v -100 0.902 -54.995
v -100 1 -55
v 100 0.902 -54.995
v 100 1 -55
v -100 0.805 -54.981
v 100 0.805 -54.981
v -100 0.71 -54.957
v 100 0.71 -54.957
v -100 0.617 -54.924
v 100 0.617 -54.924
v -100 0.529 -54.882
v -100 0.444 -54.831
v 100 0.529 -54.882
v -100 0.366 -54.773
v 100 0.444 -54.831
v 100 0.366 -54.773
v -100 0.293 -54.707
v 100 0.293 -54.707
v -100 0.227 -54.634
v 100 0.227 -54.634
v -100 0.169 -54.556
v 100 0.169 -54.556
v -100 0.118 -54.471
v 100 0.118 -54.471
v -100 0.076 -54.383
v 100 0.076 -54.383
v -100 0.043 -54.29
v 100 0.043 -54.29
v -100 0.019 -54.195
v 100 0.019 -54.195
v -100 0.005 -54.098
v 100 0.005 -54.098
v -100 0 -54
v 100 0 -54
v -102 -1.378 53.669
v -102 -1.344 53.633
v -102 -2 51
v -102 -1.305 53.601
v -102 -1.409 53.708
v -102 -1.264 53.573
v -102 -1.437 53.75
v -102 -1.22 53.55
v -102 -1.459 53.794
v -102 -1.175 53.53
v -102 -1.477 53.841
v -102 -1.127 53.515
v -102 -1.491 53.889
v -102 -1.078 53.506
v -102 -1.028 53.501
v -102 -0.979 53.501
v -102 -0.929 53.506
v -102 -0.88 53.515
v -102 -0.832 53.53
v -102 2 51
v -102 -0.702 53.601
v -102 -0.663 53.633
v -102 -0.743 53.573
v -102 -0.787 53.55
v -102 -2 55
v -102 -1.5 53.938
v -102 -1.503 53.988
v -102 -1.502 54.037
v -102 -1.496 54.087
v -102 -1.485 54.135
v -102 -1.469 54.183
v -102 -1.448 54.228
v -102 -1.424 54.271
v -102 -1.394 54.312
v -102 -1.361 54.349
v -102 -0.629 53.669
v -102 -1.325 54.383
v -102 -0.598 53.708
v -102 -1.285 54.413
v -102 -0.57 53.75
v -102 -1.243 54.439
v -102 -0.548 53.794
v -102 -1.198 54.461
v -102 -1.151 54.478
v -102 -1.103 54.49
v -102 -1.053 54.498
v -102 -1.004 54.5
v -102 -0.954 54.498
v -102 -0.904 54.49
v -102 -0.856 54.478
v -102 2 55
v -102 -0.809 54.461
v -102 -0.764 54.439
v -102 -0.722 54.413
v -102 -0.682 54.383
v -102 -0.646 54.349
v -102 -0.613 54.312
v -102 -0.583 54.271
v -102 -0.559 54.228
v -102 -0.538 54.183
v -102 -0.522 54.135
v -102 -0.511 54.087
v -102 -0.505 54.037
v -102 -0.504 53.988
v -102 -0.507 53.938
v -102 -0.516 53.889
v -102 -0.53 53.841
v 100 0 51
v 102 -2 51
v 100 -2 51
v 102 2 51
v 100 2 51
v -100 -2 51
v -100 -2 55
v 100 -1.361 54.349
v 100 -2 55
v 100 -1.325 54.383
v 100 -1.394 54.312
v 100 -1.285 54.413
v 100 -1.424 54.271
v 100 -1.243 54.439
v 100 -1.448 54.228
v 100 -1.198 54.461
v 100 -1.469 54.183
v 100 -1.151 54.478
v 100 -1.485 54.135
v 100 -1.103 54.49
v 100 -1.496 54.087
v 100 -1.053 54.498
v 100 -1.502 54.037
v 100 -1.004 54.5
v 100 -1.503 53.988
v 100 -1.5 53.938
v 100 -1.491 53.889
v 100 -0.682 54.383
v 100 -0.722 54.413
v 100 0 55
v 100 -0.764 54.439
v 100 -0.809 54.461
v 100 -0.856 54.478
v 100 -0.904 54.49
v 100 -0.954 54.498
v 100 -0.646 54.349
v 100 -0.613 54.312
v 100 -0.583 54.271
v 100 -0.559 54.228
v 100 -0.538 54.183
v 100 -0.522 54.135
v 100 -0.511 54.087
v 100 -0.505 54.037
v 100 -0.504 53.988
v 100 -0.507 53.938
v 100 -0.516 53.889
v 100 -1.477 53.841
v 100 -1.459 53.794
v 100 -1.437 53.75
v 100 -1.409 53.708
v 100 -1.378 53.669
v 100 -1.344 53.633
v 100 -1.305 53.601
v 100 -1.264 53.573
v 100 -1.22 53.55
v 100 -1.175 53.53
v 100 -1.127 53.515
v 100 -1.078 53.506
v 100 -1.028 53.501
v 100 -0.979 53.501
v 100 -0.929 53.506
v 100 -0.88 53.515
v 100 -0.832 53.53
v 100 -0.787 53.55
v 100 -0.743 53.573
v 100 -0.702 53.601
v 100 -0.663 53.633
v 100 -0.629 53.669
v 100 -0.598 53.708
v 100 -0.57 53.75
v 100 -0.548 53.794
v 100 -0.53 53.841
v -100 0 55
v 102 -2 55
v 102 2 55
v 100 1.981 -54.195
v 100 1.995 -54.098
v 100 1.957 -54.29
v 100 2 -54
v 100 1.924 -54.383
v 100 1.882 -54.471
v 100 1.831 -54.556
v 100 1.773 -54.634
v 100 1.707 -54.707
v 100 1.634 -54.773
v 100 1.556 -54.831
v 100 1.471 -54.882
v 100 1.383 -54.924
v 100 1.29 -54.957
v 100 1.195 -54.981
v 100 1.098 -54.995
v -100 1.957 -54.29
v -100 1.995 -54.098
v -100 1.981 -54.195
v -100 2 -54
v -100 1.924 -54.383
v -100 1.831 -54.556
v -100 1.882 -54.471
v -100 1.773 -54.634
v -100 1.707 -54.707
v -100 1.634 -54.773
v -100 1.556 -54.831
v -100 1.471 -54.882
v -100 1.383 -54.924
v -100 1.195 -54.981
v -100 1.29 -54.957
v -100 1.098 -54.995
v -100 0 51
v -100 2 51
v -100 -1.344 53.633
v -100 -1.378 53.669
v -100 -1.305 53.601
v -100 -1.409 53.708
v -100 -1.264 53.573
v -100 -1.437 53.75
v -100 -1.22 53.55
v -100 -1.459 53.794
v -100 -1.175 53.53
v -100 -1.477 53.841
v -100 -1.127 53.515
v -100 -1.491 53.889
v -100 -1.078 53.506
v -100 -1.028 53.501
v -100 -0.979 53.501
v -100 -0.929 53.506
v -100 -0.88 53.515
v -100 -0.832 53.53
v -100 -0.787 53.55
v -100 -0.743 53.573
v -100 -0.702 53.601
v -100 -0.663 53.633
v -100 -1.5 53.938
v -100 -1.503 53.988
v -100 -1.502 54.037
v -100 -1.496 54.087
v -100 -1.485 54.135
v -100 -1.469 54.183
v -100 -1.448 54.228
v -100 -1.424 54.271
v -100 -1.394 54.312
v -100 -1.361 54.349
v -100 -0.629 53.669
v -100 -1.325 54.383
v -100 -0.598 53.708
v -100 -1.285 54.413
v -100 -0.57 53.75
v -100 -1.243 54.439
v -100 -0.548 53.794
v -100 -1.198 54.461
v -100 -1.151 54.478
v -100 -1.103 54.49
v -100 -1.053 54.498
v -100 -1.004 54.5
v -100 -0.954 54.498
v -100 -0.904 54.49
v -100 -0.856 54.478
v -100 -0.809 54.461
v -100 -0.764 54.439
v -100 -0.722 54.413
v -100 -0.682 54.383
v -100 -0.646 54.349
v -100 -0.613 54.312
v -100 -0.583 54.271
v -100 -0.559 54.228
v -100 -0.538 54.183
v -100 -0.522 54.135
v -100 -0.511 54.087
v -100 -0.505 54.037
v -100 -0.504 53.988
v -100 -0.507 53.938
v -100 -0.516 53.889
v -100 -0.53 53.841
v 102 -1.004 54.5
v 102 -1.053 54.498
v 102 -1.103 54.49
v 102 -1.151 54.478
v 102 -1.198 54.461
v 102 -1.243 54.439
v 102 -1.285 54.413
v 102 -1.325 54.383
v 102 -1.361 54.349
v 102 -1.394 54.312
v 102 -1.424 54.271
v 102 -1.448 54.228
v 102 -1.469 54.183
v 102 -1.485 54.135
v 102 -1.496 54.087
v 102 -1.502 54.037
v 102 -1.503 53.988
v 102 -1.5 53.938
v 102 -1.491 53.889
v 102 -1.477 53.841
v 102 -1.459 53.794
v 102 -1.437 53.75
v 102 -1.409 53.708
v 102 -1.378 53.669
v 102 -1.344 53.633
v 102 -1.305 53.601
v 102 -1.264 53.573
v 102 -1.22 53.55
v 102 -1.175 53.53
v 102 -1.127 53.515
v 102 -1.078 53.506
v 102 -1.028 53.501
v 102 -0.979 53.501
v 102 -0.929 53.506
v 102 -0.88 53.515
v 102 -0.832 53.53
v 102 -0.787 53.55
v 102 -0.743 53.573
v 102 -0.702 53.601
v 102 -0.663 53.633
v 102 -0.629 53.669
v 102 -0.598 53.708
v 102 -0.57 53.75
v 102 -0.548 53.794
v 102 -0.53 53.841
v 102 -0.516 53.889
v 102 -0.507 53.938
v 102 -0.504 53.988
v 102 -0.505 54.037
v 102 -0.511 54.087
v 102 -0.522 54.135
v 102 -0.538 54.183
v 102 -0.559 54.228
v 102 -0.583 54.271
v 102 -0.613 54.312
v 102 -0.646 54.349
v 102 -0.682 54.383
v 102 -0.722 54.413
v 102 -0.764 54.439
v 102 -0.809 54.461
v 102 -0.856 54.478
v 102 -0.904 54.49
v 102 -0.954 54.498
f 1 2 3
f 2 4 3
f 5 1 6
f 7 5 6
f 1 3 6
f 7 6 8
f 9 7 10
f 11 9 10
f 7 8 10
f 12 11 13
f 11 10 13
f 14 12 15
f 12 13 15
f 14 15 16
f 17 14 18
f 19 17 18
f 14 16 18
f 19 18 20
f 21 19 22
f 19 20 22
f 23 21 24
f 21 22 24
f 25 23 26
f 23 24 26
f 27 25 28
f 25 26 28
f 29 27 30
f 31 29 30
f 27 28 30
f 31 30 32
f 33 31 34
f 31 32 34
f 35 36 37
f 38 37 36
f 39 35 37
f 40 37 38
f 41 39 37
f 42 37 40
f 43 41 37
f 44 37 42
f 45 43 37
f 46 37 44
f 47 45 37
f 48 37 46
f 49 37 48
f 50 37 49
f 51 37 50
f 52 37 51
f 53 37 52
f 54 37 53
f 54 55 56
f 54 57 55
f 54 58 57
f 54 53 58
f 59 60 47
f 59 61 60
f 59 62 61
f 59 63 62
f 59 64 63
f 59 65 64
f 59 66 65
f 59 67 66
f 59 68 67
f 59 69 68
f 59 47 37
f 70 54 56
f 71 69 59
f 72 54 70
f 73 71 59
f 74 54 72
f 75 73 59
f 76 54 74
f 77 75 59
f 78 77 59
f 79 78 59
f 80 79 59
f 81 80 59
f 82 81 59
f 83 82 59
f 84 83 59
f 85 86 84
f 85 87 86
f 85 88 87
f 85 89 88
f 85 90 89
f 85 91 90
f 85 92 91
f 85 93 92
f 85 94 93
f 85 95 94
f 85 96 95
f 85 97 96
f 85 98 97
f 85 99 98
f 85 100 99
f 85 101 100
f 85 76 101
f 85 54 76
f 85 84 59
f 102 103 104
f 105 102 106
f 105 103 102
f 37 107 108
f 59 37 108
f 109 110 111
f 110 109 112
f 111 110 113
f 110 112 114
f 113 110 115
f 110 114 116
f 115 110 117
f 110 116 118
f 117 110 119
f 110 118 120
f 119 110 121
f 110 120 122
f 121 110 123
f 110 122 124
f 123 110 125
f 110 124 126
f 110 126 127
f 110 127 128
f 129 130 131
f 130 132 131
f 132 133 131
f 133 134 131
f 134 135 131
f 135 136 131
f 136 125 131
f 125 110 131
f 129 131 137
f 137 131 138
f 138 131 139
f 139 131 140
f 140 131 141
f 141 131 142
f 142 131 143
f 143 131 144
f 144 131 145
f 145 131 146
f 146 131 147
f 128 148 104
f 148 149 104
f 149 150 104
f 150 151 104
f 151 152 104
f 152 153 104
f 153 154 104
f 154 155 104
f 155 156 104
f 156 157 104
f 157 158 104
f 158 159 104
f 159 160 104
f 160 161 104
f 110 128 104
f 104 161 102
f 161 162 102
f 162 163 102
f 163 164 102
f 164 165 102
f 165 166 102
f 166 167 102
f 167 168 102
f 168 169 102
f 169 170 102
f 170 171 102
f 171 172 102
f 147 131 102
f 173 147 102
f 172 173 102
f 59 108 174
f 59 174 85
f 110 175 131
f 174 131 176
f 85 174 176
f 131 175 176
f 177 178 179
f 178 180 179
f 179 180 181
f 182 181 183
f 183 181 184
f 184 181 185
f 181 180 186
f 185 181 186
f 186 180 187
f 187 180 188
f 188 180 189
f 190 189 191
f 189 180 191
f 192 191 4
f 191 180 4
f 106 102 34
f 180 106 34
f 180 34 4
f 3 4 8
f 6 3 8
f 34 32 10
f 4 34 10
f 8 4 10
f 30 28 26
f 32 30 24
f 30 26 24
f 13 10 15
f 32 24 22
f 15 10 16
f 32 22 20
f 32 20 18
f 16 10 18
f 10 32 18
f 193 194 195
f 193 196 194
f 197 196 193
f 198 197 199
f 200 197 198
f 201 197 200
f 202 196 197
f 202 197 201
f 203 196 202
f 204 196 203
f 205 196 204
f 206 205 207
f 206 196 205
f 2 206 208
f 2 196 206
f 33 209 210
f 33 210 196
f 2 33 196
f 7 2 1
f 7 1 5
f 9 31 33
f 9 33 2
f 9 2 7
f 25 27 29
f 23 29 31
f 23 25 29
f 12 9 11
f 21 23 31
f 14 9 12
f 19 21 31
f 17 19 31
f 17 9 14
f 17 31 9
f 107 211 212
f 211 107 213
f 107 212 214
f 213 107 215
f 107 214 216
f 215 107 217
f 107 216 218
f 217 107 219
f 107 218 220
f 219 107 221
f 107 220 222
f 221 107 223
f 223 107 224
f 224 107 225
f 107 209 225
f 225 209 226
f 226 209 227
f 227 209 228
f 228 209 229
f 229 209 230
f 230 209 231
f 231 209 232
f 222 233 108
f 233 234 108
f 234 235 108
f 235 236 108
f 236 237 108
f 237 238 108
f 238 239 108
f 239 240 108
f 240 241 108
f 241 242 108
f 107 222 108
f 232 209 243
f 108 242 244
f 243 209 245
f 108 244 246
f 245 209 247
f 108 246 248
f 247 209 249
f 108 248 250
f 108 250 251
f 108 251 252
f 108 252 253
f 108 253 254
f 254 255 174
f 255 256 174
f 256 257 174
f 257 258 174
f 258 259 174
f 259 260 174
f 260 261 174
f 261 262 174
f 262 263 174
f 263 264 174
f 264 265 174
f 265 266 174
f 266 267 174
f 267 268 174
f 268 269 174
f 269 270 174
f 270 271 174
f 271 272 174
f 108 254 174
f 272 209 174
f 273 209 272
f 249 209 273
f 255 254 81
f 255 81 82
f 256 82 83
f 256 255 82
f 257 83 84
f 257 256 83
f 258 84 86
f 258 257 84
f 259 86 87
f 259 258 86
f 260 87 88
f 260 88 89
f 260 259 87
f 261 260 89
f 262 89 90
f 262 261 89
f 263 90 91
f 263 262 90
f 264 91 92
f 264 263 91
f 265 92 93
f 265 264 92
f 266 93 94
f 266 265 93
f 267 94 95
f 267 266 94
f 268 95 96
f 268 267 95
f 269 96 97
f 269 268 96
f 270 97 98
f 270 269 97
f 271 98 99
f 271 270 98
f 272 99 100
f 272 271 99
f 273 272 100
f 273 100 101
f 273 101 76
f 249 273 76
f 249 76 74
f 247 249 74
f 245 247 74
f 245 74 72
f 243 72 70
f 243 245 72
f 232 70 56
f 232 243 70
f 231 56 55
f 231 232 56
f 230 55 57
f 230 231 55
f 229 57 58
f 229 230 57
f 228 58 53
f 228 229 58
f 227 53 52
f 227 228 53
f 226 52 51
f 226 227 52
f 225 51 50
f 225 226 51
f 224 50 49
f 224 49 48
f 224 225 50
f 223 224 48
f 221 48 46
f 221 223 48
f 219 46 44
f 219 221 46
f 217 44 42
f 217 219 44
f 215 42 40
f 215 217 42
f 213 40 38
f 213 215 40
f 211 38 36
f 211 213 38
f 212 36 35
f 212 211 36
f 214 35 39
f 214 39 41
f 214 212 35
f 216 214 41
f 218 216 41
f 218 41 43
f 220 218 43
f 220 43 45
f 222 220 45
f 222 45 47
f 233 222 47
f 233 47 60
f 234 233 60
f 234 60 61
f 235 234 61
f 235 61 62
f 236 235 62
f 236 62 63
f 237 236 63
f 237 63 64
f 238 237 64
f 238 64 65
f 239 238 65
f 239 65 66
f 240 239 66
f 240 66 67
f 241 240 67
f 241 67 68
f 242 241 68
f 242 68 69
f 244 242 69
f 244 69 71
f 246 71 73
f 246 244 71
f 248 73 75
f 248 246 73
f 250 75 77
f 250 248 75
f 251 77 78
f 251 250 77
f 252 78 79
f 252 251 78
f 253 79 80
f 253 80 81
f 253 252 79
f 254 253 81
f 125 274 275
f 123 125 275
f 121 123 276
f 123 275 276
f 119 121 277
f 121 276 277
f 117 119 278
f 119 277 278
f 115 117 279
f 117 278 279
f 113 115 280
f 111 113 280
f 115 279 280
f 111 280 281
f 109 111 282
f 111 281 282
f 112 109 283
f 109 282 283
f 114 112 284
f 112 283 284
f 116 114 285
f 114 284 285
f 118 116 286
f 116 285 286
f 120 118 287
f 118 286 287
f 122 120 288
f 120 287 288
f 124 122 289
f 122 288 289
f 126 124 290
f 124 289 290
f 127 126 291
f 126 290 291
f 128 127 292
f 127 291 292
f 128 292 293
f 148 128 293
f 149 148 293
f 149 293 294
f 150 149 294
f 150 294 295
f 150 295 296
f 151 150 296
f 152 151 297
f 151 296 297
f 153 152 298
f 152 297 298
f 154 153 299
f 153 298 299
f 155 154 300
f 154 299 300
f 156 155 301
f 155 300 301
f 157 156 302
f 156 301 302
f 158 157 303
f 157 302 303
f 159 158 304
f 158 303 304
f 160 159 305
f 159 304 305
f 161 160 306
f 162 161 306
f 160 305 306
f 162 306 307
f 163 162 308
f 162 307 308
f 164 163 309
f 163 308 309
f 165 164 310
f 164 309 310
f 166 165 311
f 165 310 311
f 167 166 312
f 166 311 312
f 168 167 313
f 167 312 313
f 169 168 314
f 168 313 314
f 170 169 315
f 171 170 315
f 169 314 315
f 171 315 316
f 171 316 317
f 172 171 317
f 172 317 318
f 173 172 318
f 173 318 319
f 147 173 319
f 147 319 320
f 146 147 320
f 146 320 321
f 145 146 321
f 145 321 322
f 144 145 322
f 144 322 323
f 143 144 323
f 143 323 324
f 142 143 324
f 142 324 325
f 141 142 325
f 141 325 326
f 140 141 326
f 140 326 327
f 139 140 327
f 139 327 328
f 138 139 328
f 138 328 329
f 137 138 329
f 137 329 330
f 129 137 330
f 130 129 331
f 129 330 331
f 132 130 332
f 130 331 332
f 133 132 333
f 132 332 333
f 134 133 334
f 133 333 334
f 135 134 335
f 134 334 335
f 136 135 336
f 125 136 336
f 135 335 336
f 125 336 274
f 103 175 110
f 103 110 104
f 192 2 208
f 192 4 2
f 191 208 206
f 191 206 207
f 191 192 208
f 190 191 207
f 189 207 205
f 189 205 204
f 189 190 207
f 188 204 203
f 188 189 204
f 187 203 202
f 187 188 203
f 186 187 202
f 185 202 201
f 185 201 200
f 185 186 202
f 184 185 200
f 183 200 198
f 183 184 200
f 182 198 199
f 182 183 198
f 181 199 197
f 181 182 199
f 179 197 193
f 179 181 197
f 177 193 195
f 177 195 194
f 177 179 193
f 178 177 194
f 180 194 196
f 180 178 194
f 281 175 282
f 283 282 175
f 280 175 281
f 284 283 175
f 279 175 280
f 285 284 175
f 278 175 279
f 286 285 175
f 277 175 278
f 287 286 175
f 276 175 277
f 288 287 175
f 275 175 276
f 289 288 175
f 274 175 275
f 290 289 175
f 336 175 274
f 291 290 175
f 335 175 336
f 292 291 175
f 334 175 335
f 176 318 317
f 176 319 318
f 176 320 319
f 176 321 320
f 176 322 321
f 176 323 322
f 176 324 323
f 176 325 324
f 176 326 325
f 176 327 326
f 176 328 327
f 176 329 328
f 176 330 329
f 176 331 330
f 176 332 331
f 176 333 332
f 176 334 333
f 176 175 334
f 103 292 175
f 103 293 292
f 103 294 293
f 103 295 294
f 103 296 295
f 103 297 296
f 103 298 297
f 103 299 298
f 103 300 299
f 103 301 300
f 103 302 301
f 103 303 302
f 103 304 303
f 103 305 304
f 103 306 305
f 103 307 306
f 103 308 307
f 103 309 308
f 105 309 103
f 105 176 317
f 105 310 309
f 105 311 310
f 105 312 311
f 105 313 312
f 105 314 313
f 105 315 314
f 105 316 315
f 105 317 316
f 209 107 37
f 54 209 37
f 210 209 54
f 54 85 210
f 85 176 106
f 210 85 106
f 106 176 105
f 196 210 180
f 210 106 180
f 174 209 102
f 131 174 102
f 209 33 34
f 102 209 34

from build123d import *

# Parameters (mm, degrees)
SKETCH1_W           = 200
SKETCH1_H           = 110
BOSS_EXTRUDE1_DEPTH = 2
FILLET1_R           = 1
SKETCH3_W           = 4
SKETCH3_H           = 4
SKETCH3_R           = 0.5
BOSS_EXTRUDE2_DEPTH = 2
BOSS_EXTRUDE3_START = 2
SKETCH4_W           = 4
SKETCH4_H           = 4
SKETCH4_R           = 0.5
BOSS_EXTRUDE3_DEPTH = 2


with BuildPart() as part:
    # Sketch1 → Boss-Extrude1 (new body)
    with BuildSketch(Plane(origin=(0, 0, 0), x_dir=(1, 0, 0), z_dir=(0, 1, 0))):
        Rectangle(SKETCH1_W, SKETCH1_H)
    extrude(amount=BOSS_EXTRUDE1_DEPTH)

    # Fillet1
    fillet1_edges = [part.edges().sort_by_distance(p)[0] for p in [
        (0, 0, -55),
        (0, 2, -55),
    ]]
    fillet(fillet1_edges, radius=FILLET1_R - 0.0001)  # a hair under: the kernel refuses the full size

    # Sketch3 → Boss-Extrude2 (add)
    with BuildSketch(Plane.ZY.offset(100)):
        with Locations((53, 0)):
            Rectangle(SKETCH3_W, SKETCH3_H)
        with Locations((54, -1.003505598)):
            Circle(SKETCH3_R, mode=Mode.SUBTRACT)
    extrude(amount=BOSS_EXTRUDE2_DEPTH)

    # Sketch4 → Boss-Extrude3 (add)
    with BuildSketch(Plane(origin=(100, 0, 0), x_dir=(0, 0, -1), z_dir=(1, 0, 0)).offset(BOSS_EXTRUDE3_START)):
        with Locations((-53, 0)):
            Rectangle(SKETCH4_W, SKETCH4_H)
        with Locations(Location((-54, -1.003505598, 0), (0, 0, 180))):
            Circle(SKETCH4_R, mode=Mode.SUBTRACT)
    extrude(amount=-BOSS_EXTRUDE3_DEPTH)


solid = part.part
